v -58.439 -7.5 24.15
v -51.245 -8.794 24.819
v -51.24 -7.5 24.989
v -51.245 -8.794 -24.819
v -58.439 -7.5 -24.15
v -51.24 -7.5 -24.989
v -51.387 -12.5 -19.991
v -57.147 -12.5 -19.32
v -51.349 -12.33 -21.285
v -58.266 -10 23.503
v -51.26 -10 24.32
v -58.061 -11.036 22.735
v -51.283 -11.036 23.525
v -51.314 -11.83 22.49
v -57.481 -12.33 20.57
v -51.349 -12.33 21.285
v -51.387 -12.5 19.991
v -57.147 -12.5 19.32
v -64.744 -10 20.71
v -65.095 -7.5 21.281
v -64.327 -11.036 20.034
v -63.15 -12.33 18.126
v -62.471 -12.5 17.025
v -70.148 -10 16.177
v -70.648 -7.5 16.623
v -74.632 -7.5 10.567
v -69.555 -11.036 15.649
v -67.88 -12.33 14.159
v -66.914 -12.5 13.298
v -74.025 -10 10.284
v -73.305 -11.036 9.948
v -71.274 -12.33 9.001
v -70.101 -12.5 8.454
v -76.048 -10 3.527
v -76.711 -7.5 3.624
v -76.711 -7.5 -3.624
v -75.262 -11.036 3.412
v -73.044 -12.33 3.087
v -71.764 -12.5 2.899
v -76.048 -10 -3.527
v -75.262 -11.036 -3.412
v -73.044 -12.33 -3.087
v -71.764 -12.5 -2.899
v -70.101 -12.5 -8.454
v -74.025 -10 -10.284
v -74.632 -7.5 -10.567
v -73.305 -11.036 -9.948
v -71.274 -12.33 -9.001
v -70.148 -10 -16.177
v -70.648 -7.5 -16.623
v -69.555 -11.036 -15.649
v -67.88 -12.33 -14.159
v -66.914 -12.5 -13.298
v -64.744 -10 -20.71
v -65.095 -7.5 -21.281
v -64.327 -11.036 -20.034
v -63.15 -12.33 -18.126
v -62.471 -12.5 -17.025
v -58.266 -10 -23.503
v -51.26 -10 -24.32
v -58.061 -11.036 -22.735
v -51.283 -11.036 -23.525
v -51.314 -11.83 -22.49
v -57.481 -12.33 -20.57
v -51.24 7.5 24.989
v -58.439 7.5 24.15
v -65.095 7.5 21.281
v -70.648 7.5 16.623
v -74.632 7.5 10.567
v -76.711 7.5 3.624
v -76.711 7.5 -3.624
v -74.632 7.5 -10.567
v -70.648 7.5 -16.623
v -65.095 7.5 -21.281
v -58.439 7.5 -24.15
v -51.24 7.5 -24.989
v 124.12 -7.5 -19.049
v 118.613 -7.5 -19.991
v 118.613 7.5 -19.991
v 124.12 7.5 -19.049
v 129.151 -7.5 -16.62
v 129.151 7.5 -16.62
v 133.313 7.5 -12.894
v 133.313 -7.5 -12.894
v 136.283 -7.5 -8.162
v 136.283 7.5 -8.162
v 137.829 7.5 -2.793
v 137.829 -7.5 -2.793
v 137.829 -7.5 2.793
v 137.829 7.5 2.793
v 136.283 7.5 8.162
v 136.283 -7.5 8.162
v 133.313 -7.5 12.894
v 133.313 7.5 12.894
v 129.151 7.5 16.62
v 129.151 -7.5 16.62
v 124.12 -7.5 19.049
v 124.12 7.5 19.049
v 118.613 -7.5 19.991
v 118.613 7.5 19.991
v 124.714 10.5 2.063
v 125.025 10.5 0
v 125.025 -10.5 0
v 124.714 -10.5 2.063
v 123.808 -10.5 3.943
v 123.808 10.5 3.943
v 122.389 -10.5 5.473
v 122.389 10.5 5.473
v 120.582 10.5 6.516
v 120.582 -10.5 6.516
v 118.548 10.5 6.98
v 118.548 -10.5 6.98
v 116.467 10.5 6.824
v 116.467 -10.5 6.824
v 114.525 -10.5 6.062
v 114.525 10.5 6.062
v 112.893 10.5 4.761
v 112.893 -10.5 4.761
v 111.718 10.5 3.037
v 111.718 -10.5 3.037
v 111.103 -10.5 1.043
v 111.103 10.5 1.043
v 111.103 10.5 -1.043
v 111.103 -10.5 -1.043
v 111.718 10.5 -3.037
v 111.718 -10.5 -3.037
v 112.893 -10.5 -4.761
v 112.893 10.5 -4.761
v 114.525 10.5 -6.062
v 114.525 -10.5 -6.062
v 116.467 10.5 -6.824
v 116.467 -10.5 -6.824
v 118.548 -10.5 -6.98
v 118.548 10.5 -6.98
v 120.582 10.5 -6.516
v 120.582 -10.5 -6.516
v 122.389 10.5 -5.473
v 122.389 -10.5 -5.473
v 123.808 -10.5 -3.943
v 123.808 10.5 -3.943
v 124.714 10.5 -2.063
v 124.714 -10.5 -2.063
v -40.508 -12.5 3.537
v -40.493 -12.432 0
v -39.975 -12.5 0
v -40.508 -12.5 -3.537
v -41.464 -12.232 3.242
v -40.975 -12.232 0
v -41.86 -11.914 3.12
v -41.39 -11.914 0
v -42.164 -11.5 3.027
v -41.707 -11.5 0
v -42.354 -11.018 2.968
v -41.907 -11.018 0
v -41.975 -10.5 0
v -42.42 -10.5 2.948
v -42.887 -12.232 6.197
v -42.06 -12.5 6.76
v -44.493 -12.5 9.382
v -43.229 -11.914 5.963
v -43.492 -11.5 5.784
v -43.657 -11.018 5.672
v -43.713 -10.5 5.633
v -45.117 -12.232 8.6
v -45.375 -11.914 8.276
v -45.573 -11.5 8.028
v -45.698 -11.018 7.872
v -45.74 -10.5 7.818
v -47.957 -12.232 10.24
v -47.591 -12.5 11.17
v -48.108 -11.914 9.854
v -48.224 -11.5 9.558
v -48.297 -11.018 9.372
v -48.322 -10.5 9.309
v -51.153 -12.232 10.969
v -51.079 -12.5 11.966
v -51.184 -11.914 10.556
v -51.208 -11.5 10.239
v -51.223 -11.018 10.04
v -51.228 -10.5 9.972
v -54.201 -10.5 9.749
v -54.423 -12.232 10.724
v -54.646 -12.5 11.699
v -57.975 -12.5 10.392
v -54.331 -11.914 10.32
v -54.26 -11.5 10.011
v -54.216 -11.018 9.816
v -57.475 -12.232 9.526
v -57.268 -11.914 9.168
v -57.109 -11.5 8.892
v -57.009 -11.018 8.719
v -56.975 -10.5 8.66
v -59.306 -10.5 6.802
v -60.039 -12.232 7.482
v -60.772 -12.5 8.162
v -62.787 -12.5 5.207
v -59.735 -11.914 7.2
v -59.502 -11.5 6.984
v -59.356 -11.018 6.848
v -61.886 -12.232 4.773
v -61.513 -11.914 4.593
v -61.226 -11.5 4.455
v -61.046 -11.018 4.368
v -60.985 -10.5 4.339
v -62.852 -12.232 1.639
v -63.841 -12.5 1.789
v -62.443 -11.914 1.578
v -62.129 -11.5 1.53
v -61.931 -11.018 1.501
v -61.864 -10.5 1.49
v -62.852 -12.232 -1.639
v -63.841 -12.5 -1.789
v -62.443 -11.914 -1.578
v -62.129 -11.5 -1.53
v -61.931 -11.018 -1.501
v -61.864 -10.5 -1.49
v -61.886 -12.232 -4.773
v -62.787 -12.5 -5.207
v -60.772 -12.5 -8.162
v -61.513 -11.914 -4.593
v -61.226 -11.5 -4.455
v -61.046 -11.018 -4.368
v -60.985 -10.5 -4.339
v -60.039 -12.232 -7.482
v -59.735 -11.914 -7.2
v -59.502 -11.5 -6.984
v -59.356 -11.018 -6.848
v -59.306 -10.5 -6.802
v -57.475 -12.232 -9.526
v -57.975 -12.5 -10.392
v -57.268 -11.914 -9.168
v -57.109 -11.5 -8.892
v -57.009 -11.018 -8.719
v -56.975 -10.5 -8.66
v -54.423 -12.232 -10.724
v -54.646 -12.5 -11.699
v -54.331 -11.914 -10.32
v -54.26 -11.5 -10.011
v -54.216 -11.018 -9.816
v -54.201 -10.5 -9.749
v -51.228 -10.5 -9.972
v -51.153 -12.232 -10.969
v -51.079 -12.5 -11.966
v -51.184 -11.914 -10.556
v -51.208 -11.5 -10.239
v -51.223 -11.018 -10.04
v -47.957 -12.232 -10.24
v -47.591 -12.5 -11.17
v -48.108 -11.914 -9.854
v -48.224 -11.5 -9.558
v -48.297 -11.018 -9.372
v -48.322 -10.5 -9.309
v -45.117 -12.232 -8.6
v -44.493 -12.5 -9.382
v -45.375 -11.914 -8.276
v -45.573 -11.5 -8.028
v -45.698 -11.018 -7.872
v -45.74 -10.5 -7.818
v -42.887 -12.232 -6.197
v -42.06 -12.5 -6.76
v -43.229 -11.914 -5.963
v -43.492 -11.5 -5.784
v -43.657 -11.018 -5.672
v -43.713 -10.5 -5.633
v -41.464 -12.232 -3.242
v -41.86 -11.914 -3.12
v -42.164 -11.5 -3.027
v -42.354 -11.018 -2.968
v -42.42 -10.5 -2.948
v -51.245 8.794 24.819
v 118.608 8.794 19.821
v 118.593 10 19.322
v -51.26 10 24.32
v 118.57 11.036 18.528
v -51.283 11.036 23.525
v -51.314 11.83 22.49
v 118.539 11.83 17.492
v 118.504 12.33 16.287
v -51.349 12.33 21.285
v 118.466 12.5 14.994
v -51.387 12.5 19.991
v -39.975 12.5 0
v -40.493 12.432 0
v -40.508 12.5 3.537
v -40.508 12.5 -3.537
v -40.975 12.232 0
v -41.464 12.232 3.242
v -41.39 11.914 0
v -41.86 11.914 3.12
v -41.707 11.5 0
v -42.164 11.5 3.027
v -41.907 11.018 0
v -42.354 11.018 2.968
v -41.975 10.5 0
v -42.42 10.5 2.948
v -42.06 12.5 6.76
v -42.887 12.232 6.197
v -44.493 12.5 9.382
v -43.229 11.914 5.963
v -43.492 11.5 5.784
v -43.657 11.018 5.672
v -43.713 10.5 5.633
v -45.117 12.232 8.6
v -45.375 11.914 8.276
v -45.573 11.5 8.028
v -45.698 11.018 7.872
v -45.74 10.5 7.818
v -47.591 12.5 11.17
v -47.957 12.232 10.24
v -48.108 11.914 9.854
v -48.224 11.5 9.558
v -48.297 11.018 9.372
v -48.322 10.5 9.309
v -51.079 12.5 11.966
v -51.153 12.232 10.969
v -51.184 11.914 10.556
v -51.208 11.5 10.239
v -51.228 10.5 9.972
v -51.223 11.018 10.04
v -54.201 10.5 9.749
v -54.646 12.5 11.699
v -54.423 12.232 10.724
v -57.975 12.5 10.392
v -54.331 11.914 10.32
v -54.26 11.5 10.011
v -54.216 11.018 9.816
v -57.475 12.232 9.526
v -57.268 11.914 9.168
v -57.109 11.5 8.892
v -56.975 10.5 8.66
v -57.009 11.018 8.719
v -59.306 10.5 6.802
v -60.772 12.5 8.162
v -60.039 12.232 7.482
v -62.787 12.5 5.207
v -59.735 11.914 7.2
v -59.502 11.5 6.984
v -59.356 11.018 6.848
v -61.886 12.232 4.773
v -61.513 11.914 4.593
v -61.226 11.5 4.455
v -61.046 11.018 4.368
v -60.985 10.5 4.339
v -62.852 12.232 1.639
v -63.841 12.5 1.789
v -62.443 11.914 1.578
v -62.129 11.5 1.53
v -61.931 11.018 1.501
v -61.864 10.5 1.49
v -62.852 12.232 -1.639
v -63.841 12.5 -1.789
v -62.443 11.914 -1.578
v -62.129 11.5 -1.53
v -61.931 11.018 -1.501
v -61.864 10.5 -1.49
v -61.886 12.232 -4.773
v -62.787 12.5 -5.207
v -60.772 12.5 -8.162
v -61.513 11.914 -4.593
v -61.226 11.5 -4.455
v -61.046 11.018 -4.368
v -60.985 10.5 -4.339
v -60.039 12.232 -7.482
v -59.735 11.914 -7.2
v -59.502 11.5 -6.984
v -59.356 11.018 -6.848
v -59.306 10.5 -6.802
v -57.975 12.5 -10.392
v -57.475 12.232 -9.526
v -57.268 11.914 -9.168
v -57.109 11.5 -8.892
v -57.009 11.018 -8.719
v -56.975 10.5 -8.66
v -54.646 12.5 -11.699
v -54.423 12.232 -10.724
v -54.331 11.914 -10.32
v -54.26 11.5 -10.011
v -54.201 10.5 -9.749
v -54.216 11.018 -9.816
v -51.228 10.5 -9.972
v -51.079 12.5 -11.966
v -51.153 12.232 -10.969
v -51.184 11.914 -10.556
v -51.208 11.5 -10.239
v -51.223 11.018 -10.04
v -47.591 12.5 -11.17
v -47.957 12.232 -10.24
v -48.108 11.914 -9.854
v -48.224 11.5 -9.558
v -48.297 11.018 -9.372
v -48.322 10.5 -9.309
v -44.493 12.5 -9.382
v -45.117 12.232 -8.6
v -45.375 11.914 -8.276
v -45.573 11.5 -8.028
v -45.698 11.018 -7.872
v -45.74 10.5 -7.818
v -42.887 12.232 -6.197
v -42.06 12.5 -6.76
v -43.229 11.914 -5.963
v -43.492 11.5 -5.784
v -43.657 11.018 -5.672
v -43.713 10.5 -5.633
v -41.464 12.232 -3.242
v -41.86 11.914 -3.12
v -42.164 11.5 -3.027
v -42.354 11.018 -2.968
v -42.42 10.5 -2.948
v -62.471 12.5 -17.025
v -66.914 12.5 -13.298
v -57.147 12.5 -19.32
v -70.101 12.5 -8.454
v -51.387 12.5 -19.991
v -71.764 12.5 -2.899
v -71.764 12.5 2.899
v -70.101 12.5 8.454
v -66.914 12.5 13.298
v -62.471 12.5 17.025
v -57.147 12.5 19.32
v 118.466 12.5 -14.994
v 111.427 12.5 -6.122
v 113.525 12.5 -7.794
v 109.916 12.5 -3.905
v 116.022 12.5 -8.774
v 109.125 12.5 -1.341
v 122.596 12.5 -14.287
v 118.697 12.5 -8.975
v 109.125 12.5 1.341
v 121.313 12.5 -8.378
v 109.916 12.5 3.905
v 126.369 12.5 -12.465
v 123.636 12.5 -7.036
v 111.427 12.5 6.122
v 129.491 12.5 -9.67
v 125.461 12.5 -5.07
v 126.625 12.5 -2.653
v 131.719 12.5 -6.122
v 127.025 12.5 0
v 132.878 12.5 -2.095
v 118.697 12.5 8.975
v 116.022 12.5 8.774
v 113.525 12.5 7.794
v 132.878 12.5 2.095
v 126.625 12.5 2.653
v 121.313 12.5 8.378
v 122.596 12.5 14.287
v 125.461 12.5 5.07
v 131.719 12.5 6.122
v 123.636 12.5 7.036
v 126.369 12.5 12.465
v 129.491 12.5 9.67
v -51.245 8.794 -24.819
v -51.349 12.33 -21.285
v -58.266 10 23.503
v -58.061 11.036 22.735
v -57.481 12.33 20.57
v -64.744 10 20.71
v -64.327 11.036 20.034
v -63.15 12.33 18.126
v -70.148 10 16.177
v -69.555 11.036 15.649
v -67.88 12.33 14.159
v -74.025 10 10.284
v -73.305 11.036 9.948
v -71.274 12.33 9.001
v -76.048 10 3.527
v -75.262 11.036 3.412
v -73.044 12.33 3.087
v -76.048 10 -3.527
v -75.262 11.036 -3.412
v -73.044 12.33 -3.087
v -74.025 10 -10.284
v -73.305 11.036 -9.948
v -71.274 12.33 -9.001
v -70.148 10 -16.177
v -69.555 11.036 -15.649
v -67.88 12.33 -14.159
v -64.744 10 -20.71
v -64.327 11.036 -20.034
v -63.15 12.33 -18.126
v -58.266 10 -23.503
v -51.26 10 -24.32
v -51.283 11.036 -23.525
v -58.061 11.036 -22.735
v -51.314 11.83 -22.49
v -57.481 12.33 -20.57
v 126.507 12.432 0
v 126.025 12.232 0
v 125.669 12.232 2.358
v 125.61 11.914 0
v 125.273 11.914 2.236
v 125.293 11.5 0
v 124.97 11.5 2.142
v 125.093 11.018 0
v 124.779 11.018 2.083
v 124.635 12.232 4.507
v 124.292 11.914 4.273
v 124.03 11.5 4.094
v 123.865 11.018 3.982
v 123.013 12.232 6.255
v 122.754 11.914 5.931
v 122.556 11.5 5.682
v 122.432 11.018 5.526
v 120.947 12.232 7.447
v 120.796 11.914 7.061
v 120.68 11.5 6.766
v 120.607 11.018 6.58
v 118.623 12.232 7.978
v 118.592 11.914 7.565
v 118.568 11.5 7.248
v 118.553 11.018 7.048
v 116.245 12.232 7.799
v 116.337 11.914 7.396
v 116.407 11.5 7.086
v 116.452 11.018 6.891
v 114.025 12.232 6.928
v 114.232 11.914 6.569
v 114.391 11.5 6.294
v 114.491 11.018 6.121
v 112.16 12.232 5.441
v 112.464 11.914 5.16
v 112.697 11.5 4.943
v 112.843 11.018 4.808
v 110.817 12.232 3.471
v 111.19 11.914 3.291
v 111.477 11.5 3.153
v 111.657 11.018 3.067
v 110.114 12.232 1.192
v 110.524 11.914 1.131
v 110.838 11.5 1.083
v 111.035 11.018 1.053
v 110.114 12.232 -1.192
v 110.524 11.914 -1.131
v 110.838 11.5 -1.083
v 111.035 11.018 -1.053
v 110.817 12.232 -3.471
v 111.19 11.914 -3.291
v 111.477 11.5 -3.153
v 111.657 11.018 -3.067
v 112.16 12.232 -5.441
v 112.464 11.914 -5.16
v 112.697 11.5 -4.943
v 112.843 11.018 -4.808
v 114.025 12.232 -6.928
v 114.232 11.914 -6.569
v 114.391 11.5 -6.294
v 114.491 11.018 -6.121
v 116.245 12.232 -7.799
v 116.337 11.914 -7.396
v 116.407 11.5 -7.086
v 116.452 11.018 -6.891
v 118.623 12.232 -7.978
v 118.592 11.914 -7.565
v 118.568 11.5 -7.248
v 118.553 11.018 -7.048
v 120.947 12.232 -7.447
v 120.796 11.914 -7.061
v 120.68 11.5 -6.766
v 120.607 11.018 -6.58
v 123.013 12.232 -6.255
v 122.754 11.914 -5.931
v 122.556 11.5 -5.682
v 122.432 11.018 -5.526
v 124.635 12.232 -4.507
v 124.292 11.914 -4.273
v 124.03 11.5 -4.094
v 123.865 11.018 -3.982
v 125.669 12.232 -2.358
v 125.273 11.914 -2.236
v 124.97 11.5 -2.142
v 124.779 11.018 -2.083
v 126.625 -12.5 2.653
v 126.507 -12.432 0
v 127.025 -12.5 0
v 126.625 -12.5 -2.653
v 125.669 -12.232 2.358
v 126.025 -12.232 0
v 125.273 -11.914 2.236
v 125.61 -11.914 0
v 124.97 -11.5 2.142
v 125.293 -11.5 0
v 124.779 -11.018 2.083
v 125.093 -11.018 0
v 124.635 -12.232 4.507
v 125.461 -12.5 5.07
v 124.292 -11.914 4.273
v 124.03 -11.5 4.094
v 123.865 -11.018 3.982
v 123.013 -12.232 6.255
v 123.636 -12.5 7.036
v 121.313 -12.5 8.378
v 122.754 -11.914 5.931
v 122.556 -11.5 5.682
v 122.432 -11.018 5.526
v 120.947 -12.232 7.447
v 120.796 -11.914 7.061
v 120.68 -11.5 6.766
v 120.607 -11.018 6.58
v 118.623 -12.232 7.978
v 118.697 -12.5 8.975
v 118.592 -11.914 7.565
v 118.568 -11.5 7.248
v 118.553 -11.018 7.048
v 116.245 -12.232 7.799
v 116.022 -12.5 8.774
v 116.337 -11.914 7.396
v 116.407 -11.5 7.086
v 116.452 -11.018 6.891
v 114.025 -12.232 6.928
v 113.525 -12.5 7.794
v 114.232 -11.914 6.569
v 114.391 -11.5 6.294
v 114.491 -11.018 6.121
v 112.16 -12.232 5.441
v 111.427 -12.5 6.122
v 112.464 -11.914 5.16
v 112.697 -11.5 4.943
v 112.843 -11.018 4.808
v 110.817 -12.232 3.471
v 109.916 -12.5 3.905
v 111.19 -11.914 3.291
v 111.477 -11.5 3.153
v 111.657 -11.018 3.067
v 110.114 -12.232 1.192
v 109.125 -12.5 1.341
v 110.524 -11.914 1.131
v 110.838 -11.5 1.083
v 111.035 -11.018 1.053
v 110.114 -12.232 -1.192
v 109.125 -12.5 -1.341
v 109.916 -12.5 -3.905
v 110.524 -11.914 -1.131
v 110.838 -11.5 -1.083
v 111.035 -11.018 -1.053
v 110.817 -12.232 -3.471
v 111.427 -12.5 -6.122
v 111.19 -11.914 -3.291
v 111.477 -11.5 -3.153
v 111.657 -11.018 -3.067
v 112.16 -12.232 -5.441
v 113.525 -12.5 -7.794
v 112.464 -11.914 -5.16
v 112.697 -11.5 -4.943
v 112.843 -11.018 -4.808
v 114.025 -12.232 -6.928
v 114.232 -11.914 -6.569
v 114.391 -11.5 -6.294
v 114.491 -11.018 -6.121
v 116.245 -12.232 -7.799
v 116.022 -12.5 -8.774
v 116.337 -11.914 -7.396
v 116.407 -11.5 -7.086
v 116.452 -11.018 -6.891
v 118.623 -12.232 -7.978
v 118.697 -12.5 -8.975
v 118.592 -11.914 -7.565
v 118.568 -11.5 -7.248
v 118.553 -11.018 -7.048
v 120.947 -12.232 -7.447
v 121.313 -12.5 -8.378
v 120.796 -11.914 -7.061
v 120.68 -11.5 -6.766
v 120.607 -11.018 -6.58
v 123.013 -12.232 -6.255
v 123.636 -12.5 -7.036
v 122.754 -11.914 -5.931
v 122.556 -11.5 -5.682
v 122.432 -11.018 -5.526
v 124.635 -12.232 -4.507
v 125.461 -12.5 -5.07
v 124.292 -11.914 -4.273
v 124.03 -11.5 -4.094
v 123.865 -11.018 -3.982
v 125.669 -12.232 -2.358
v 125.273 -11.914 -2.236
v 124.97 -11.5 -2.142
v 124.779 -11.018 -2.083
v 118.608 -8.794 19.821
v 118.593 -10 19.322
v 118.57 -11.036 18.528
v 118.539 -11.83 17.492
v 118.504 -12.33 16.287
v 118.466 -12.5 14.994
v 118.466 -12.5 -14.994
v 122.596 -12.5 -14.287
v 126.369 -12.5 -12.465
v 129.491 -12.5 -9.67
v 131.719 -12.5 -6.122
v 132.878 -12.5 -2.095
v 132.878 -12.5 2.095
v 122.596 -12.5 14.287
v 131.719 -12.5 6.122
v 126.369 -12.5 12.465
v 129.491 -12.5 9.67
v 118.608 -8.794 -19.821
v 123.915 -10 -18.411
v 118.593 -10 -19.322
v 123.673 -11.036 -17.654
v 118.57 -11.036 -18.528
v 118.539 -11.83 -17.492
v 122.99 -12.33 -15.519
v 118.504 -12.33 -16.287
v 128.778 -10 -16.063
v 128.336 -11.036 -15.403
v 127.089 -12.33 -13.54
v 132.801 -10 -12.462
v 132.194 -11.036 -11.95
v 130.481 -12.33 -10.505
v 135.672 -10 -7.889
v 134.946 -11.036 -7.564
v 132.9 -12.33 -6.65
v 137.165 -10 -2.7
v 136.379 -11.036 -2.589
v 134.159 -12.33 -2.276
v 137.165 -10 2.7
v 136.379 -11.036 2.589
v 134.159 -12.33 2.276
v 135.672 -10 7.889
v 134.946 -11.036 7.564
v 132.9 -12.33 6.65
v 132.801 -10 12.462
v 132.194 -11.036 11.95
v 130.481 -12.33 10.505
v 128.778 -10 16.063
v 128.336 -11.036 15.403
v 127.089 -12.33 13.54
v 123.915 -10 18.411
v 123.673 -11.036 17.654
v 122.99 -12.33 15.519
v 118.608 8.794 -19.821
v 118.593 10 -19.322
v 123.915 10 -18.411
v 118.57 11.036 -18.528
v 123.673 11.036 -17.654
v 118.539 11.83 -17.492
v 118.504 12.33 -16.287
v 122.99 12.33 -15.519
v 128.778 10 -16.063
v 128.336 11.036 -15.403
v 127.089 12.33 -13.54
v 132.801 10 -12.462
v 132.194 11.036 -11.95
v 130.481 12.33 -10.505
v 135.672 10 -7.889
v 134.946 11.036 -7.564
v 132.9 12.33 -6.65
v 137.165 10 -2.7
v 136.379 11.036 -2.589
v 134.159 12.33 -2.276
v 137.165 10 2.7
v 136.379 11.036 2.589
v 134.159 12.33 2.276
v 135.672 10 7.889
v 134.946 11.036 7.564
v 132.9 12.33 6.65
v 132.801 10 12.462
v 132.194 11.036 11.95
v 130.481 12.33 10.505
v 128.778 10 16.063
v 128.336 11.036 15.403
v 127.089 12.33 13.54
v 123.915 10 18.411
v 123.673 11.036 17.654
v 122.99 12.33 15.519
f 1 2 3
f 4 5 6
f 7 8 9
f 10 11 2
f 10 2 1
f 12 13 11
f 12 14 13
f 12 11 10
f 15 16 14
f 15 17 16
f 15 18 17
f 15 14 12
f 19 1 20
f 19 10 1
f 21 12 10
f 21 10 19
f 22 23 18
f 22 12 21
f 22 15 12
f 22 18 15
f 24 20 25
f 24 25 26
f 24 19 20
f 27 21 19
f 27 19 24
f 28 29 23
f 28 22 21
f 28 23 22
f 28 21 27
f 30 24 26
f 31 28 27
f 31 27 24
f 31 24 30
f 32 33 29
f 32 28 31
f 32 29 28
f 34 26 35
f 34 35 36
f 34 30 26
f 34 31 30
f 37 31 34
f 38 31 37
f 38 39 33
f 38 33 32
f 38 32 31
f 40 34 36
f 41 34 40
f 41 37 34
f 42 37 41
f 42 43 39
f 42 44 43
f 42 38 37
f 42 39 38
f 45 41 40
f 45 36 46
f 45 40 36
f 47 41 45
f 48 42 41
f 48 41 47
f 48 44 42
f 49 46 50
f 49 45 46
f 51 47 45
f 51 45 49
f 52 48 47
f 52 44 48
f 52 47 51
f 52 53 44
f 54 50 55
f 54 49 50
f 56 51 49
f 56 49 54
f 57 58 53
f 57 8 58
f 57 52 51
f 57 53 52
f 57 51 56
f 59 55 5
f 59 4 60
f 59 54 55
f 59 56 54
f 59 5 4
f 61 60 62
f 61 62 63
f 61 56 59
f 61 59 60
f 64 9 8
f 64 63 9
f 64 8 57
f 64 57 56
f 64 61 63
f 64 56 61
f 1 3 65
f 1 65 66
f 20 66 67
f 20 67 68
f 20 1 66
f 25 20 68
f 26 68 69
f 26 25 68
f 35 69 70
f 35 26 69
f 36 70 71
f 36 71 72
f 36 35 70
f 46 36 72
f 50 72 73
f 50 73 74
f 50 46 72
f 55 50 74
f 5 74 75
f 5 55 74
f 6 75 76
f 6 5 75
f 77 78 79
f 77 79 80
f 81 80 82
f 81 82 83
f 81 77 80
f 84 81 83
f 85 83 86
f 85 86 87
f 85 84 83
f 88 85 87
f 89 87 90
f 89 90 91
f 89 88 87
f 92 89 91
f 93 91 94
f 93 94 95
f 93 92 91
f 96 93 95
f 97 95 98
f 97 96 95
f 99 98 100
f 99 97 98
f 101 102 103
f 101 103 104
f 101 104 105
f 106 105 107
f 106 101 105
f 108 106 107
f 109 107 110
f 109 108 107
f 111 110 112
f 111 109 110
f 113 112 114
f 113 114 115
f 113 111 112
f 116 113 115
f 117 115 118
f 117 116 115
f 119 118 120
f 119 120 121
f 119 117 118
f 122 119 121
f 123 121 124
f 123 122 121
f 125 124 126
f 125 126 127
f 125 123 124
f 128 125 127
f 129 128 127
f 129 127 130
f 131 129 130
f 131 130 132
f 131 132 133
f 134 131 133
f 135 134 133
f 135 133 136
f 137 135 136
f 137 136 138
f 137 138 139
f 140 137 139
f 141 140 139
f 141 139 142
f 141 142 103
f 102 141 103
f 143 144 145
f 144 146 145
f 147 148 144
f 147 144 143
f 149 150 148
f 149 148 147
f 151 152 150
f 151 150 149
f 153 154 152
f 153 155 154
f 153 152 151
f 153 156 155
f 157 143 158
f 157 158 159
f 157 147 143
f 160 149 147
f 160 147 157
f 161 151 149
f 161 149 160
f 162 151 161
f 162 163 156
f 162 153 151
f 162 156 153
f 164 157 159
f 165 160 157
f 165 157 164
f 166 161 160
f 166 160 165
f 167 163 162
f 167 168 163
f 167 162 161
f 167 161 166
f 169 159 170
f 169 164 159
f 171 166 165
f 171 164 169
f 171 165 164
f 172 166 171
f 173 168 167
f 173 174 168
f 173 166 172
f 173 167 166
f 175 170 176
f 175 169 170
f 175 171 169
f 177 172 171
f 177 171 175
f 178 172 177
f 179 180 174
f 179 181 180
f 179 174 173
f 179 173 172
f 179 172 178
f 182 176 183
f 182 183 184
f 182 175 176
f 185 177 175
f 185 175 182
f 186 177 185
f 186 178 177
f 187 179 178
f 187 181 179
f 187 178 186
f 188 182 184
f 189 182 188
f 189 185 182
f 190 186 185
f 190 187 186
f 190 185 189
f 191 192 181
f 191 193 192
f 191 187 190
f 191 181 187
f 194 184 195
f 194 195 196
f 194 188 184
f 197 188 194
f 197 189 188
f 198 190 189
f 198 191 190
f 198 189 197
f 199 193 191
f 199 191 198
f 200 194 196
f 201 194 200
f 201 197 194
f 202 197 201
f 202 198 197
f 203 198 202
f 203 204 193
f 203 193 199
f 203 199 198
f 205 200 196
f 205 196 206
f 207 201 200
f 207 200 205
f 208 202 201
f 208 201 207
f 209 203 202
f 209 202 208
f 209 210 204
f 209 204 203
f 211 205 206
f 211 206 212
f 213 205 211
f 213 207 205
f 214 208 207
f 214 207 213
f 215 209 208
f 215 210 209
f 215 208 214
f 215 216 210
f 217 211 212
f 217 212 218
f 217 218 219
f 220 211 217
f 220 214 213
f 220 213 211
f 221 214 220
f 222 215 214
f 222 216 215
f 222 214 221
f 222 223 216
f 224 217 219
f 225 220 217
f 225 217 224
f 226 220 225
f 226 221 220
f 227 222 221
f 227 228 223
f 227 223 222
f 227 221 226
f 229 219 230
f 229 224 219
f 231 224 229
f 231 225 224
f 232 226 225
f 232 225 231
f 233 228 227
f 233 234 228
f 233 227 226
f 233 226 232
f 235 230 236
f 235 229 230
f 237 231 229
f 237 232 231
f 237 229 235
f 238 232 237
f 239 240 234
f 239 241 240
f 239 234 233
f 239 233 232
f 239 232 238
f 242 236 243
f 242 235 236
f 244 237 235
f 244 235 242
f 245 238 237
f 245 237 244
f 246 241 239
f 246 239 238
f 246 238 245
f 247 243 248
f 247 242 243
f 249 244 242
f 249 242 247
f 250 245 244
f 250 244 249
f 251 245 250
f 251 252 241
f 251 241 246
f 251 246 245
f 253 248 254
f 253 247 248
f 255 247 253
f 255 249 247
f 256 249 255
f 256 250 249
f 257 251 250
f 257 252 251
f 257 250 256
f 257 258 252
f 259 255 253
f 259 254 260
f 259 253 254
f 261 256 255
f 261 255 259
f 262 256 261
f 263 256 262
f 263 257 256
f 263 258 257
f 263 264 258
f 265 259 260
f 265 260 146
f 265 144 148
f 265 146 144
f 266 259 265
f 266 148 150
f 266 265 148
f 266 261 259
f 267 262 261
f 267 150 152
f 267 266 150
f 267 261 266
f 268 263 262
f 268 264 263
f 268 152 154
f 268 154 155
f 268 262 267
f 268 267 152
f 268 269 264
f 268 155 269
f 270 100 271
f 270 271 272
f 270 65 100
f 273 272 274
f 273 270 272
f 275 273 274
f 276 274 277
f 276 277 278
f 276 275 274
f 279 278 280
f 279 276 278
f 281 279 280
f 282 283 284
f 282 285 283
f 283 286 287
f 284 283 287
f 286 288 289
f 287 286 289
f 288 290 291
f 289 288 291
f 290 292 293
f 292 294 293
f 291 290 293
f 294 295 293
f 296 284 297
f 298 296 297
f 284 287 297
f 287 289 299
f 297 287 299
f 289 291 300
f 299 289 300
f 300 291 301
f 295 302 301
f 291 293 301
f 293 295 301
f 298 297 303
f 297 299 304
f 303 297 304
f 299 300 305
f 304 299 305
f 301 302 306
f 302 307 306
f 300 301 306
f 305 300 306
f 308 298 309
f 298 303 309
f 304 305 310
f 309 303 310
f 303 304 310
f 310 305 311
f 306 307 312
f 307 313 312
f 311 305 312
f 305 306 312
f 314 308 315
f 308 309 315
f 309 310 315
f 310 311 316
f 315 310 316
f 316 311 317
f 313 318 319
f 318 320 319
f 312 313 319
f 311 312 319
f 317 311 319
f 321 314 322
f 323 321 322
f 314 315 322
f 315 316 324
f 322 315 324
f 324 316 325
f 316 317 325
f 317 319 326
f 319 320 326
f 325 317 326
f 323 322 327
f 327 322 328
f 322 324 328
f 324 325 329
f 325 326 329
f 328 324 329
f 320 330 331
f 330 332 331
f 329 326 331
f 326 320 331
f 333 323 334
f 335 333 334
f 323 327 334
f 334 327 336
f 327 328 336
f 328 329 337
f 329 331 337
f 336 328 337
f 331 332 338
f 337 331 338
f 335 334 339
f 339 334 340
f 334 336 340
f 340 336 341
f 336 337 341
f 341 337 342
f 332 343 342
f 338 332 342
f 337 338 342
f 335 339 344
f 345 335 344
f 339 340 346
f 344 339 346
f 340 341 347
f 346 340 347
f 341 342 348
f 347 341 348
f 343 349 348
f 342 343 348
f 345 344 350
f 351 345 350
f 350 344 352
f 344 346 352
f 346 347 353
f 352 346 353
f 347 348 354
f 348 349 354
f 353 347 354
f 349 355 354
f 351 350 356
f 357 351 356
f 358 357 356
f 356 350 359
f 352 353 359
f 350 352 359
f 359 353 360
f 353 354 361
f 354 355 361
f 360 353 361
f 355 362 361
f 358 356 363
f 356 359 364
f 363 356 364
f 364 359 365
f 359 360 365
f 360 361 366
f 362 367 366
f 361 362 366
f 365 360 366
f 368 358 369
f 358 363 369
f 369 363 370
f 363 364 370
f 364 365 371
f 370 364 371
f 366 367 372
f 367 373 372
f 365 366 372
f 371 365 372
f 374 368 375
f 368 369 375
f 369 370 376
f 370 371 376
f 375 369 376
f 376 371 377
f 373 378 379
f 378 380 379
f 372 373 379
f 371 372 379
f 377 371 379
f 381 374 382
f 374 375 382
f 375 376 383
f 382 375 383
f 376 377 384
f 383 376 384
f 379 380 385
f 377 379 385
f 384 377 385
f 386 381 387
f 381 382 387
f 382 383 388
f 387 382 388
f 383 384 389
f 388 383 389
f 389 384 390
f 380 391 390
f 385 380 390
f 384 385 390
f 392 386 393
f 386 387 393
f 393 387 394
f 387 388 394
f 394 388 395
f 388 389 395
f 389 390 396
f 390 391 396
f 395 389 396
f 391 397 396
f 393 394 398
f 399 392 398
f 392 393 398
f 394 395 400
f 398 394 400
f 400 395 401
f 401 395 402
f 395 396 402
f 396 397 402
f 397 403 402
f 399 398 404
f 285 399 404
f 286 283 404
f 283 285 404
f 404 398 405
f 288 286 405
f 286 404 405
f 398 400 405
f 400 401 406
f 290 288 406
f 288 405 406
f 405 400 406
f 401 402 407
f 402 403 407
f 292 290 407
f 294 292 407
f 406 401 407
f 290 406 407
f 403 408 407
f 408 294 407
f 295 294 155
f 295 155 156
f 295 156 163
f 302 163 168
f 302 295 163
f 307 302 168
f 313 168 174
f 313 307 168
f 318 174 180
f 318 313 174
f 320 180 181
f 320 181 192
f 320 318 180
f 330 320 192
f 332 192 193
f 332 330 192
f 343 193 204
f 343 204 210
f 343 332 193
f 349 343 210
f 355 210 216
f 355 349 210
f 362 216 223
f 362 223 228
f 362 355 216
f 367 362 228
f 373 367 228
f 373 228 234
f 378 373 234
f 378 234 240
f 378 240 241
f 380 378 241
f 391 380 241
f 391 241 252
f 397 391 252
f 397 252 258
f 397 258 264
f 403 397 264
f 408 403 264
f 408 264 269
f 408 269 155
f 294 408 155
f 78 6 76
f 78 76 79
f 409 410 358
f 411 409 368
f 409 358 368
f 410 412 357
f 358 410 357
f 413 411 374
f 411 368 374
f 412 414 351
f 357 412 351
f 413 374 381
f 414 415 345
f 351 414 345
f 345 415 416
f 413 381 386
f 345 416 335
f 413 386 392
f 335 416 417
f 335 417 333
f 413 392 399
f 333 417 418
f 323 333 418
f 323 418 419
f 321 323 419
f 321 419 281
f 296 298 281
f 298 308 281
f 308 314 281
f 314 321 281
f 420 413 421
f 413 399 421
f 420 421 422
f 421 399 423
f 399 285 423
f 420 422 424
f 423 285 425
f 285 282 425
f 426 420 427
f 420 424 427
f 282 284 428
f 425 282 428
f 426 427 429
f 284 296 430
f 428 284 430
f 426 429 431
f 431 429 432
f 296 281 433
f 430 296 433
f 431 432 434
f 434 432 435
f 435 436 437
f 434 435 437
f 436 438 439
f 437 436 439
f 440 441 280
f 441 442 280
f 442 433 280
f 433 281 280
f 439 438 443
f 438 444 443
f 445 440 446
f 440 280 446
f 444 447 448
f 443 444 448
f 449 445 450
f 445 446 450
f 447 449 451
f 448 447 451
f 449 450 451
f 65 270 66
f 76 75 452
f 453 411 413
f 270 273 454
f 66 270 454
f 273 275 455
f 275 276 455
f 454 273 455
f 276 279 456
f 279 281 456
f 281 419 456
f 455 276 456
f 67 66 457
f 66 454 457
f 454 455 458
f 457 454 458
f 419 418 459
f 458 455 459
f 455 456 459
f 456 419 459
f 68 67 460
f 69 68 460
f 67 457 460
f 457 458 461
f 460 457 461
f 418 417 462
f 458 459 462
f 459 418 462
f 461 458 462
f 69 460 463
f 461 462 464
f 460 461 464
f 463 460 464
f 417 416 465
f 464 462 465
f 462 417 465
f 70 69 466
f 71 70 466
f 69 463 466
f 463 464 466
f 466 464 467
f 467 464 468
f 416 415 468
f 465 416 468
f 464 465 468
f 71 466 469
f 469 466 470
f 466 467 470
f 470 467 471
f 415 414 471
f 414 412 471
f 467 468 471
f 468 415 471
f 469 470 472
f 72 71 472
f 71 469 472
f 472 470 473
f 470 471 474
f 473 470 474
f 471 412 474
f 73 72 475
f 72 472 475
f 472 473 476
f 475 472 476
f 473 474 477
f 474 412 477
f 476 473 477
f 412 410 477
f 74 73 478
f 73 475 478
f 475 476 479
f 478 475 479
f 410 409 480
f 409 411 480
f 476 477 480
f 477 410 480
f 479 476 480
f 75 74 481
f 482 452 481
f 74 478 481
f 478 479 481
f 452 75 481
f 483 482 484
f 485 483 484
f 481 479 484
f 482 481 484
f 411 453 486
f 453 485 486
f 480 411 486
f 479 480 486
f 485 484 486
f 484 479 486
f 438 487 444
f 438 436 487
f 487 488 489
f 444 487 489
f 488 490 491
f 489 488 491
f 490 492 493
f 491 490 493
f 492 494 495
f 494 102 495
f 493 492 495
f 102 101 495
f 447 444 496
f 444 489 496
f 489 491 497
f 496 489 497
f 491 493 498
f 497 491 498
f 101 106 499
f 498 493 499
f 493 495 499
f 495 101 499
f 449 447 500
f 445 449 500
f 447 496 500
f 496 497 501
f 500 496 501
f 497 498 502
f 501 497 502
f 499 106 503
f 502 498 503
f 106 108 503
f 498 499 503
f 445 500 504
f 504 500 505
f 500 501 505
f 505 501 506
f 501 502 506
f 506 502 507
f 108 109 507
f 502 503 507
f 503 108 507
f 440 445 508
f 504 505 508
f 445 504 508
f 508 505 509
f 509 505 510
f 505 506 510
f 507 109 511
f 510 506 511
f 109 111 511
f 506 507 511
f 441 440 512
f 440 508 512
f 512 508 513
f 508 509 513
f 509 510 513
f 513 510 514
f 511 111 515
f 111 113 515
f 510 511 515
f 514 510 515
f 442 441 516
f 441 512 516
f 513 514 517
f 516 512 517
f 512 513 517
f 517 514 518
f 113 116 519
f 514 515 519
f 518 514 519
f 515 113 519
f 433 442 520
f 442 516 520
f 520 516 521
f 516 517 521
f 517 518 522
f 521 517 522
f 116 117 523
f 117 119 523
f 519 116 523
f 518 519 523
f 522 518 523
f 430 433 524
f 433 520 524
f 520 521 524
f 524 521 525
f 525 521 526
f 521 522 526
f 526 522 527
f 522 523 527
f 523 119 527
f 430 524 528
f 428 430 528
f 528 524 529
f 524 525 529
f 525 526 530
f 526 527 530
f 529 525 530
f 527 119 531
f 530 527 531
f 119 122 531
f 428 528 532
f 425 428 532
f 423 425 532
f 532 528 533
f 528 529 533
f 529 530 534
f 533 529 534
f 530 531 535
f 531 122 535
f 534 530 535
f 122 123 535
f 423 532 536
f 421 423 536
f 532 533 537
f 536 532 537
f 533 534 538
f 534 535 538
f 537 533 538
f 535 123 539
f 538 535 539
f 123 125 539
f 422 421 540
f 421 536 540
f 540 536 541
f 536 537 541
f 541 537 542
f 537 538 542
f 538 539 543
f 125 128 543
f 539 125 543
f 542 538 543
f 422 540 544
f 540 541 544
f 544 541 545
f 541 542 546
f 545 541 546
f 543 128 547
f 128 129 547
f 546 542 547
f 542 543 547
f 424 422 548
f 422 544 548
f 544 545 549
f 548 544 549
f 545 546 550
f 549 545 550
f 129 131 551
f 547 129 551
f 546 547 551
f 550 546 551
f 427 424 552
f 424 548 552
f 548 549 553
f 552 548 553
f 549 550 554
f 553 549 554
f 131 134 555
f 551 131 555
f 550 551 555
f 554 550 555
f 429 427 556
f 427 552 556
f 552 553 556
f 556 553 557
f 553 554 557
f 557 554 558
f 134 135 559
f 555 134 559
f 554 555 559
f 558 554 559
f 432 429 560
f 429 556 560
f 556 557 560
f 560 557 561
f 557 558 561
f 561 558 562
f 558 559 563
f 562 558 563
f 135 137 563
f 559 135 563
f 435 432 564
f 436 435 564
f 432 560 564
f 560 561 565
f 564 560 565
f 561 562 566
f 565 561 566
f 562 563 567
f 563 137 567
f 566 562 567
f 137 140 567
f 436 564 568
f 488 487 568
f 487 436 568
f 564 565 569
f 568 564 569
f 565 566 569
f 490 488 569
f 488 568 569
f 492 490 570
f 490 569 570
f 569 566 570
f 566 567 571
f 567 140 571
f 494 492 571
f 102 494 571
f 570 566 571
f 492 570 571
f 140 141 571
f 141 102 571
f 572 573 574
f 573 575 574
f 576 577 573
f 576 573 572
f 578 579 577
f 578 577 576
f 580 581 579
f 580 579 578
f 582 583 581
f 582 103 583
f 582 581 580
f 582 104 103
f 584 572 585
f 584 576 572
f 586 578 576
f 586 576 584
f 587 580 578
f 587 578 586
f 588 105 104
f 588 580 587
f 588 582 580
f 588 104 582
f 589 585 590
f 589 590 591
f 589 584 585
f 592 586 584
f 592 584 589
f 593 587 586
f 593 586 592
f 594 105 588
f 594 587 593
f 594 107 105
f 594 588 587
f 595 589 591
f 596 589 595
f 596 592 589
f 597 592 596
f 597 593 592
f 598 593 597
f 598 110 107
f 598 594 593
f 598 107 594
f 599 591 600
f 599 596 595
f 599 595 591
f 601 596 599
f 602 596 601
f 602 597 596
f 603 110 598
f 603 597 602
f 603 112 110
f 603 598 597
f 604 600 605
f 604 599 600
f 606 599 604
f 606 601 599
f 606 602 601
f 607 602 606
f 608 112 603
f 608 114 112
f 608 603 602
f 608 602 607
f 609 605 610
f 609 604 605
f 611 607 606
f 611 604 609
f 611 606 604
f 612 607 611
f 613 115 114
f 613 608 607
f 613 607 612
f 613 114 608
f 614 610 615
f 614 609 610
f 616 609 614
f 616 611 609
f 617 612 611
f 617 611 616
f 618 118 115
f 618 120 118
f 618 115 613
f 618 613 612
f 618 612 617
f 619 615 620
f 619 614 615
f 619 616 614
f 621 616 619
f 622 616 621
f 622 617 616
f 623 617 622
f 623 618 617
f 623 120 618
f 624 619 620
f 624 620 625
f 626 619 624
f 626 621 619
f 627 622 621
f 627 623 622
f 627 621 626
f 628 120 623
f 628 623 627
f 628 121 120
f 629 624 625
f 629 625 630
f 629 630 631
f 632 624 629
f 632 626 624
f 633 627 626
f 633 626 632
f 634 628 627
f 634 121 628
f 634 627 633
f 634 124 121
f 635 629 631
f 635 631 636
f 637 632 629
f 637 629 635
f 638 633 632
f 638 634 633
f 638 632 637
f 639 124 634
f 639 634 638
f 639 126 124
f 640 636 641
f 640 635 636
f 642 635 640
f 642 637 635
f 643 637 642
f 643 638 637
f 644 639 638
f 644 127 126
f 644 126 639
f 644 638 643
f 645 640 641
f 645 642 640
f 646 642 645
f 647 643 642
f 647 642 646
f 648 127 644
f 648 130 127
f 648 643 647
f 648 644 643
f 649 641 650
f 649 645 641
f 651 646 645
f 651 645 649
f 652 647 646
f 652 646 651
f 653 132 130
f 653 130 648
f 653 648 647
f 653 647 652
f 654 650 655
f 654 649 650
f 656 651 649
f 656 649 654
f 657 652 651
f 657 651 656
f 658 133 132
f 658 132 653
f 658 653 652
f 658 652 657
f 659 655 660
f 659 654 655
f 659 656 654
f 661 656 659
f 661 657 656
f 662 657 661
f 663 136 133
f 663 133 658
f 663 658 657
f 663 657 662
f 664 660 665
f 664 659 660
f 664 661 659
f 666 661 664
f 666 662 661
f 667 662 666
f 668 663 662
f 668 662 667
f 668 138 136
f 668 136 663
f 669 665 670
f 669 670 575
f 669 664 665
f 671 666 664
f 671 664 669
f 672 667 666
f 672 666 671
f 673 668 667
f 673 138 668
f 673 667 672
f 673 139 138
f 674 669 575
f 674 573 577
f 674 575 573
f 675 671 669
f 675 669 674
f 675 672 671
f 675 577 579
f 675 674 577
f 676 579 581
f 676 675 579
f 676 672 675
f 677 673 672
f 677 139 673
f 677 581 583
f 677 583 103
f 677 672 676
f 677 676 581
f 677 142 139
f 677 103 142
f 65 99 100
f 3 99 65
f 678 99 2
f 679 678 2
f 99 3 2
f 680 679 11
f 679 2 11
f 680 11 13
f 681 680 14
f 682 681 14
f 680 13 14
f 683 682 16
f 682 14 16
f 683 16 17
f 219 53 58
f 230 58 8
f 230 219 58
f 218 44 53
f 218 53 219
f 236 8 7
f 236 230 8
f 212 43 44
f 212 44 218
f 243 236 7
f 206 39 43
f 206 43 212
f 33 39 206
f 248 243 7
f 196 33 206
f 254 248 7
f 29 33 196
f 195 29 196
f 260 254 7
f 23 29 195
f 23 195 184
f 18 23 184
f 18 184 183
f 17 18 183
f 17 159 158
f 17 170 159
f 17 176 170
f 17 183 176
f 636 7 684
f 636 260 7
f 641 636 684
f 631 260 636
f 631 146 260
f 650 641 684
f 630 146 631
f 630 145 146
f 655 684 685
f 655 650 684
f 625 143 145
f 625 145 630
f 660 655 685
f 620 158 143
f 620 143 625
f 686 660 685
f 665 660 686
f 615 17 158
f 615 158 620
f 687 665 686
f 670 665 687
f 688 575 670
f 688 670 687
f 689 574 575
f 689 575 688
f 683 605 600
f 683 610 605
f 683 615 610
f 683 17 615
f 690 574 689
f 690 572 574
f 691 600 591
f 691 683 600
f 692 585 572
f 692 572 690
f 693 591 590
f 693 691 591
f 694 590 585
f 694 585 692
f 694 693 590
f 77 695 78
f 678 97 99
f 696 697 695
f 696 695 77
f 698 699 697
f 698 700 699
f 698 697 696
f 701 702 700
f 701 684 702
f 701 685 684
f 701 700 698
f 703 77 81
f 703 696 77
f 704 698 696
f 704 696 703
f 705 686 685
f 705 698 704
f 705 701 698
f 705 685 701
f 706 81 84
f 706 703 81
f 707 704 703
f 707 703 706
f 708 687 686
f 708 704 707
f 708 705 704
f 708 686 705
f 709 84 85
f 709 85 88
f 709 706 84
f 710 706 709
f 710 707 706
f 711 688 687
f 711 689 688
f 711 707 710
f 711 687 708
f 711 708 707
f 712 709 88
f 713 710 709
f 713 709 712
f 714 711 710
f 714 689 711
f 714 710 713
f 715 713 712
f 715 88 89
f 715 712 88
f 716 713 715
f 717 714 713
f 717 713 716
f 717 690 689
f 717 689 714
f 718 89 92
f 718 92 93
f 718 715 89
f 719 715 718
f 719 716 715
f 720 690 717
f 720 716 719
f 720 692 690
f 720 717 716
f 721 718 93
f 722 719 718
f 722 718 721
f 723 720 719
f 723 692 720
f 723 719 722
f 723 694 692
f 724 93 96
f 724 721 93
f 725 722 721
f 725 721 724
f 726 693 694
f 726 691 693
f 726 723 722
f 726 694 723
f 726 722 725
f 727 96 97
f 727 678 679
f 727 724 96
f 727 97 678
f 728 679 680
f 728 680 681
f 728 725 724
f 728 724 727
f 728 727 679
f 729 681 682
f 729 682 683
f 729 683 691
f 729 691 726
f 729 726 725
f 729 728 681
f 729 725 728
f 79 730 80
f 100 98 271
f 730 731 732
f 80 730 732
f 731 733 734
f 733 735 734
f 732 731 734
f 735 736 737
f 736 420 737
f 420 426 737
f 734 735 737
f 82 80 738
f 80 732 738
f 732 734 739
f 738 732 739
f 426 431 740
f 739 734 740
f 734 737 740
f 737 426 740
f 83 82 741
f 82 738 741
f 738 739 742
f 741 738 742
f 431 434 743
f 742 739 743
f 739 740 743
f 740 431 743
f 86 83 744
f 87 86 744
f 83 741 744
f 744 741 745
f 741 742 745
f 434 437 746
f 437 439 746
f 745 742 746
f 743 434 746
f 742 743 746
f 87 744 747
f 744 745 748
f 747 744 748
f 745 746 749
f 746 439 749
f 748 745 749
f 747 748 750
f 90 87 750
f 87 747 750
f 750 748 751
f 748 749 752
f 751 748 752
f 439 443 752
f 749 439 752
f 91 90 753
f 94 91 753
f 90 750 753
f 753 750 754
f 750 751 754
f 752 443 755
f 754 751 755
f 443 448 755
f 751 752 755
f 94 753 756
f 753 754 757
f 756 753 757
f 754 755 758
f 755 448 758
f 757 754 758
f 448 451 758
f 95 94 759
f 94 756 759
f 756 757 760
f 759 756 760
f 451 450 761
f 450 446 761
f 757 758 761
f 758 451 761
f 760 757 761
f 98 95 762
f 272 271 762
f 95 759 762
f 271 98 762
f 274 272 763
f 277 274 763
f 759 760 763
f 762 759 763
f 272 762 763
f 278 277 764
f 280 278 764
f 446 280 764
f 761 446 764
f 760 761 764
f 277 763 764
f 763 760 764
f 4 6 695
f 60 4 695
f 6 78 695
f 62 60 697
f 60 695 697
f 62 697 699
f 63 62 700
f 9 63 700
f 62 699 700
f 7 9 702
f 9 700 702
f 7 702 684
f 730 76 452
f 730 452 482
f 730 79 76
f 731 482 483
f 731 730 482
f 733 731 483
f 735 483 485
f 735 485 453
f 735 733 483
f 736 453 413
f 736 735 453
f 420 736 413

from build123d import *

# Parameters (mm, degrees)
F0_R     = 10
F0_R_2   = 7
F1_DEPTH = 12.5
F2_R     = 5
F3_R     = 2


with BuildPart() as f1:
    # F0 (on Front) → F1 (new body, symmetric)
    with BuildSketch(Plane.XZ):
        with BuildLine():
            Line((118.612932, 19.991348), (-51.240009, 24.989185))
            ThreePointArc((-51.240009, 24.989185), (-76.975303, 0), (-51.240009, -24.989185))
            Line((-51.240009, -24.989185), (118.612932, -19.991348))
            ThreePointArc((118.612932, -19.991348), (138.024697, 0), (118.612932, 19.991348))
        make_face()
        with Locations((-51.975303, 0)):
            Circle(F0_R, mode=Mode.SUBTRACT)
        with Locations((118.024697, 0)):
            Circle(F0_R_2, mode=Mode.SUBTRACT)
    extrude(amount=F1_DEPTH, both=True)

    # F2
    f2_edges = [f1.edges().sort_by_distance(p)[0] for p in [
        (33.686461, -12.5, -22.490266),
        (33.686461, -12.5, 22.490266),
        (33.686461, 12.5, -22.490266),
        (-76.975303, 12.5, 0),
    ]]
    fillet(f2_edges, radius=F2_R)

    # F3
    f3_edges = [f1.edges().sort_by_distance(p)[0] for p in [
        (-61.975303, -12.5, 0),
        (-61.975303, 12.5, 0),
        (111.024697, -12.5, 0),
        (125.024697, 0, 0),
        (111.024697, 12.5, 0),
    ]]
    fillet(f3_edges, radius=F3_R)


solid = f1.part
